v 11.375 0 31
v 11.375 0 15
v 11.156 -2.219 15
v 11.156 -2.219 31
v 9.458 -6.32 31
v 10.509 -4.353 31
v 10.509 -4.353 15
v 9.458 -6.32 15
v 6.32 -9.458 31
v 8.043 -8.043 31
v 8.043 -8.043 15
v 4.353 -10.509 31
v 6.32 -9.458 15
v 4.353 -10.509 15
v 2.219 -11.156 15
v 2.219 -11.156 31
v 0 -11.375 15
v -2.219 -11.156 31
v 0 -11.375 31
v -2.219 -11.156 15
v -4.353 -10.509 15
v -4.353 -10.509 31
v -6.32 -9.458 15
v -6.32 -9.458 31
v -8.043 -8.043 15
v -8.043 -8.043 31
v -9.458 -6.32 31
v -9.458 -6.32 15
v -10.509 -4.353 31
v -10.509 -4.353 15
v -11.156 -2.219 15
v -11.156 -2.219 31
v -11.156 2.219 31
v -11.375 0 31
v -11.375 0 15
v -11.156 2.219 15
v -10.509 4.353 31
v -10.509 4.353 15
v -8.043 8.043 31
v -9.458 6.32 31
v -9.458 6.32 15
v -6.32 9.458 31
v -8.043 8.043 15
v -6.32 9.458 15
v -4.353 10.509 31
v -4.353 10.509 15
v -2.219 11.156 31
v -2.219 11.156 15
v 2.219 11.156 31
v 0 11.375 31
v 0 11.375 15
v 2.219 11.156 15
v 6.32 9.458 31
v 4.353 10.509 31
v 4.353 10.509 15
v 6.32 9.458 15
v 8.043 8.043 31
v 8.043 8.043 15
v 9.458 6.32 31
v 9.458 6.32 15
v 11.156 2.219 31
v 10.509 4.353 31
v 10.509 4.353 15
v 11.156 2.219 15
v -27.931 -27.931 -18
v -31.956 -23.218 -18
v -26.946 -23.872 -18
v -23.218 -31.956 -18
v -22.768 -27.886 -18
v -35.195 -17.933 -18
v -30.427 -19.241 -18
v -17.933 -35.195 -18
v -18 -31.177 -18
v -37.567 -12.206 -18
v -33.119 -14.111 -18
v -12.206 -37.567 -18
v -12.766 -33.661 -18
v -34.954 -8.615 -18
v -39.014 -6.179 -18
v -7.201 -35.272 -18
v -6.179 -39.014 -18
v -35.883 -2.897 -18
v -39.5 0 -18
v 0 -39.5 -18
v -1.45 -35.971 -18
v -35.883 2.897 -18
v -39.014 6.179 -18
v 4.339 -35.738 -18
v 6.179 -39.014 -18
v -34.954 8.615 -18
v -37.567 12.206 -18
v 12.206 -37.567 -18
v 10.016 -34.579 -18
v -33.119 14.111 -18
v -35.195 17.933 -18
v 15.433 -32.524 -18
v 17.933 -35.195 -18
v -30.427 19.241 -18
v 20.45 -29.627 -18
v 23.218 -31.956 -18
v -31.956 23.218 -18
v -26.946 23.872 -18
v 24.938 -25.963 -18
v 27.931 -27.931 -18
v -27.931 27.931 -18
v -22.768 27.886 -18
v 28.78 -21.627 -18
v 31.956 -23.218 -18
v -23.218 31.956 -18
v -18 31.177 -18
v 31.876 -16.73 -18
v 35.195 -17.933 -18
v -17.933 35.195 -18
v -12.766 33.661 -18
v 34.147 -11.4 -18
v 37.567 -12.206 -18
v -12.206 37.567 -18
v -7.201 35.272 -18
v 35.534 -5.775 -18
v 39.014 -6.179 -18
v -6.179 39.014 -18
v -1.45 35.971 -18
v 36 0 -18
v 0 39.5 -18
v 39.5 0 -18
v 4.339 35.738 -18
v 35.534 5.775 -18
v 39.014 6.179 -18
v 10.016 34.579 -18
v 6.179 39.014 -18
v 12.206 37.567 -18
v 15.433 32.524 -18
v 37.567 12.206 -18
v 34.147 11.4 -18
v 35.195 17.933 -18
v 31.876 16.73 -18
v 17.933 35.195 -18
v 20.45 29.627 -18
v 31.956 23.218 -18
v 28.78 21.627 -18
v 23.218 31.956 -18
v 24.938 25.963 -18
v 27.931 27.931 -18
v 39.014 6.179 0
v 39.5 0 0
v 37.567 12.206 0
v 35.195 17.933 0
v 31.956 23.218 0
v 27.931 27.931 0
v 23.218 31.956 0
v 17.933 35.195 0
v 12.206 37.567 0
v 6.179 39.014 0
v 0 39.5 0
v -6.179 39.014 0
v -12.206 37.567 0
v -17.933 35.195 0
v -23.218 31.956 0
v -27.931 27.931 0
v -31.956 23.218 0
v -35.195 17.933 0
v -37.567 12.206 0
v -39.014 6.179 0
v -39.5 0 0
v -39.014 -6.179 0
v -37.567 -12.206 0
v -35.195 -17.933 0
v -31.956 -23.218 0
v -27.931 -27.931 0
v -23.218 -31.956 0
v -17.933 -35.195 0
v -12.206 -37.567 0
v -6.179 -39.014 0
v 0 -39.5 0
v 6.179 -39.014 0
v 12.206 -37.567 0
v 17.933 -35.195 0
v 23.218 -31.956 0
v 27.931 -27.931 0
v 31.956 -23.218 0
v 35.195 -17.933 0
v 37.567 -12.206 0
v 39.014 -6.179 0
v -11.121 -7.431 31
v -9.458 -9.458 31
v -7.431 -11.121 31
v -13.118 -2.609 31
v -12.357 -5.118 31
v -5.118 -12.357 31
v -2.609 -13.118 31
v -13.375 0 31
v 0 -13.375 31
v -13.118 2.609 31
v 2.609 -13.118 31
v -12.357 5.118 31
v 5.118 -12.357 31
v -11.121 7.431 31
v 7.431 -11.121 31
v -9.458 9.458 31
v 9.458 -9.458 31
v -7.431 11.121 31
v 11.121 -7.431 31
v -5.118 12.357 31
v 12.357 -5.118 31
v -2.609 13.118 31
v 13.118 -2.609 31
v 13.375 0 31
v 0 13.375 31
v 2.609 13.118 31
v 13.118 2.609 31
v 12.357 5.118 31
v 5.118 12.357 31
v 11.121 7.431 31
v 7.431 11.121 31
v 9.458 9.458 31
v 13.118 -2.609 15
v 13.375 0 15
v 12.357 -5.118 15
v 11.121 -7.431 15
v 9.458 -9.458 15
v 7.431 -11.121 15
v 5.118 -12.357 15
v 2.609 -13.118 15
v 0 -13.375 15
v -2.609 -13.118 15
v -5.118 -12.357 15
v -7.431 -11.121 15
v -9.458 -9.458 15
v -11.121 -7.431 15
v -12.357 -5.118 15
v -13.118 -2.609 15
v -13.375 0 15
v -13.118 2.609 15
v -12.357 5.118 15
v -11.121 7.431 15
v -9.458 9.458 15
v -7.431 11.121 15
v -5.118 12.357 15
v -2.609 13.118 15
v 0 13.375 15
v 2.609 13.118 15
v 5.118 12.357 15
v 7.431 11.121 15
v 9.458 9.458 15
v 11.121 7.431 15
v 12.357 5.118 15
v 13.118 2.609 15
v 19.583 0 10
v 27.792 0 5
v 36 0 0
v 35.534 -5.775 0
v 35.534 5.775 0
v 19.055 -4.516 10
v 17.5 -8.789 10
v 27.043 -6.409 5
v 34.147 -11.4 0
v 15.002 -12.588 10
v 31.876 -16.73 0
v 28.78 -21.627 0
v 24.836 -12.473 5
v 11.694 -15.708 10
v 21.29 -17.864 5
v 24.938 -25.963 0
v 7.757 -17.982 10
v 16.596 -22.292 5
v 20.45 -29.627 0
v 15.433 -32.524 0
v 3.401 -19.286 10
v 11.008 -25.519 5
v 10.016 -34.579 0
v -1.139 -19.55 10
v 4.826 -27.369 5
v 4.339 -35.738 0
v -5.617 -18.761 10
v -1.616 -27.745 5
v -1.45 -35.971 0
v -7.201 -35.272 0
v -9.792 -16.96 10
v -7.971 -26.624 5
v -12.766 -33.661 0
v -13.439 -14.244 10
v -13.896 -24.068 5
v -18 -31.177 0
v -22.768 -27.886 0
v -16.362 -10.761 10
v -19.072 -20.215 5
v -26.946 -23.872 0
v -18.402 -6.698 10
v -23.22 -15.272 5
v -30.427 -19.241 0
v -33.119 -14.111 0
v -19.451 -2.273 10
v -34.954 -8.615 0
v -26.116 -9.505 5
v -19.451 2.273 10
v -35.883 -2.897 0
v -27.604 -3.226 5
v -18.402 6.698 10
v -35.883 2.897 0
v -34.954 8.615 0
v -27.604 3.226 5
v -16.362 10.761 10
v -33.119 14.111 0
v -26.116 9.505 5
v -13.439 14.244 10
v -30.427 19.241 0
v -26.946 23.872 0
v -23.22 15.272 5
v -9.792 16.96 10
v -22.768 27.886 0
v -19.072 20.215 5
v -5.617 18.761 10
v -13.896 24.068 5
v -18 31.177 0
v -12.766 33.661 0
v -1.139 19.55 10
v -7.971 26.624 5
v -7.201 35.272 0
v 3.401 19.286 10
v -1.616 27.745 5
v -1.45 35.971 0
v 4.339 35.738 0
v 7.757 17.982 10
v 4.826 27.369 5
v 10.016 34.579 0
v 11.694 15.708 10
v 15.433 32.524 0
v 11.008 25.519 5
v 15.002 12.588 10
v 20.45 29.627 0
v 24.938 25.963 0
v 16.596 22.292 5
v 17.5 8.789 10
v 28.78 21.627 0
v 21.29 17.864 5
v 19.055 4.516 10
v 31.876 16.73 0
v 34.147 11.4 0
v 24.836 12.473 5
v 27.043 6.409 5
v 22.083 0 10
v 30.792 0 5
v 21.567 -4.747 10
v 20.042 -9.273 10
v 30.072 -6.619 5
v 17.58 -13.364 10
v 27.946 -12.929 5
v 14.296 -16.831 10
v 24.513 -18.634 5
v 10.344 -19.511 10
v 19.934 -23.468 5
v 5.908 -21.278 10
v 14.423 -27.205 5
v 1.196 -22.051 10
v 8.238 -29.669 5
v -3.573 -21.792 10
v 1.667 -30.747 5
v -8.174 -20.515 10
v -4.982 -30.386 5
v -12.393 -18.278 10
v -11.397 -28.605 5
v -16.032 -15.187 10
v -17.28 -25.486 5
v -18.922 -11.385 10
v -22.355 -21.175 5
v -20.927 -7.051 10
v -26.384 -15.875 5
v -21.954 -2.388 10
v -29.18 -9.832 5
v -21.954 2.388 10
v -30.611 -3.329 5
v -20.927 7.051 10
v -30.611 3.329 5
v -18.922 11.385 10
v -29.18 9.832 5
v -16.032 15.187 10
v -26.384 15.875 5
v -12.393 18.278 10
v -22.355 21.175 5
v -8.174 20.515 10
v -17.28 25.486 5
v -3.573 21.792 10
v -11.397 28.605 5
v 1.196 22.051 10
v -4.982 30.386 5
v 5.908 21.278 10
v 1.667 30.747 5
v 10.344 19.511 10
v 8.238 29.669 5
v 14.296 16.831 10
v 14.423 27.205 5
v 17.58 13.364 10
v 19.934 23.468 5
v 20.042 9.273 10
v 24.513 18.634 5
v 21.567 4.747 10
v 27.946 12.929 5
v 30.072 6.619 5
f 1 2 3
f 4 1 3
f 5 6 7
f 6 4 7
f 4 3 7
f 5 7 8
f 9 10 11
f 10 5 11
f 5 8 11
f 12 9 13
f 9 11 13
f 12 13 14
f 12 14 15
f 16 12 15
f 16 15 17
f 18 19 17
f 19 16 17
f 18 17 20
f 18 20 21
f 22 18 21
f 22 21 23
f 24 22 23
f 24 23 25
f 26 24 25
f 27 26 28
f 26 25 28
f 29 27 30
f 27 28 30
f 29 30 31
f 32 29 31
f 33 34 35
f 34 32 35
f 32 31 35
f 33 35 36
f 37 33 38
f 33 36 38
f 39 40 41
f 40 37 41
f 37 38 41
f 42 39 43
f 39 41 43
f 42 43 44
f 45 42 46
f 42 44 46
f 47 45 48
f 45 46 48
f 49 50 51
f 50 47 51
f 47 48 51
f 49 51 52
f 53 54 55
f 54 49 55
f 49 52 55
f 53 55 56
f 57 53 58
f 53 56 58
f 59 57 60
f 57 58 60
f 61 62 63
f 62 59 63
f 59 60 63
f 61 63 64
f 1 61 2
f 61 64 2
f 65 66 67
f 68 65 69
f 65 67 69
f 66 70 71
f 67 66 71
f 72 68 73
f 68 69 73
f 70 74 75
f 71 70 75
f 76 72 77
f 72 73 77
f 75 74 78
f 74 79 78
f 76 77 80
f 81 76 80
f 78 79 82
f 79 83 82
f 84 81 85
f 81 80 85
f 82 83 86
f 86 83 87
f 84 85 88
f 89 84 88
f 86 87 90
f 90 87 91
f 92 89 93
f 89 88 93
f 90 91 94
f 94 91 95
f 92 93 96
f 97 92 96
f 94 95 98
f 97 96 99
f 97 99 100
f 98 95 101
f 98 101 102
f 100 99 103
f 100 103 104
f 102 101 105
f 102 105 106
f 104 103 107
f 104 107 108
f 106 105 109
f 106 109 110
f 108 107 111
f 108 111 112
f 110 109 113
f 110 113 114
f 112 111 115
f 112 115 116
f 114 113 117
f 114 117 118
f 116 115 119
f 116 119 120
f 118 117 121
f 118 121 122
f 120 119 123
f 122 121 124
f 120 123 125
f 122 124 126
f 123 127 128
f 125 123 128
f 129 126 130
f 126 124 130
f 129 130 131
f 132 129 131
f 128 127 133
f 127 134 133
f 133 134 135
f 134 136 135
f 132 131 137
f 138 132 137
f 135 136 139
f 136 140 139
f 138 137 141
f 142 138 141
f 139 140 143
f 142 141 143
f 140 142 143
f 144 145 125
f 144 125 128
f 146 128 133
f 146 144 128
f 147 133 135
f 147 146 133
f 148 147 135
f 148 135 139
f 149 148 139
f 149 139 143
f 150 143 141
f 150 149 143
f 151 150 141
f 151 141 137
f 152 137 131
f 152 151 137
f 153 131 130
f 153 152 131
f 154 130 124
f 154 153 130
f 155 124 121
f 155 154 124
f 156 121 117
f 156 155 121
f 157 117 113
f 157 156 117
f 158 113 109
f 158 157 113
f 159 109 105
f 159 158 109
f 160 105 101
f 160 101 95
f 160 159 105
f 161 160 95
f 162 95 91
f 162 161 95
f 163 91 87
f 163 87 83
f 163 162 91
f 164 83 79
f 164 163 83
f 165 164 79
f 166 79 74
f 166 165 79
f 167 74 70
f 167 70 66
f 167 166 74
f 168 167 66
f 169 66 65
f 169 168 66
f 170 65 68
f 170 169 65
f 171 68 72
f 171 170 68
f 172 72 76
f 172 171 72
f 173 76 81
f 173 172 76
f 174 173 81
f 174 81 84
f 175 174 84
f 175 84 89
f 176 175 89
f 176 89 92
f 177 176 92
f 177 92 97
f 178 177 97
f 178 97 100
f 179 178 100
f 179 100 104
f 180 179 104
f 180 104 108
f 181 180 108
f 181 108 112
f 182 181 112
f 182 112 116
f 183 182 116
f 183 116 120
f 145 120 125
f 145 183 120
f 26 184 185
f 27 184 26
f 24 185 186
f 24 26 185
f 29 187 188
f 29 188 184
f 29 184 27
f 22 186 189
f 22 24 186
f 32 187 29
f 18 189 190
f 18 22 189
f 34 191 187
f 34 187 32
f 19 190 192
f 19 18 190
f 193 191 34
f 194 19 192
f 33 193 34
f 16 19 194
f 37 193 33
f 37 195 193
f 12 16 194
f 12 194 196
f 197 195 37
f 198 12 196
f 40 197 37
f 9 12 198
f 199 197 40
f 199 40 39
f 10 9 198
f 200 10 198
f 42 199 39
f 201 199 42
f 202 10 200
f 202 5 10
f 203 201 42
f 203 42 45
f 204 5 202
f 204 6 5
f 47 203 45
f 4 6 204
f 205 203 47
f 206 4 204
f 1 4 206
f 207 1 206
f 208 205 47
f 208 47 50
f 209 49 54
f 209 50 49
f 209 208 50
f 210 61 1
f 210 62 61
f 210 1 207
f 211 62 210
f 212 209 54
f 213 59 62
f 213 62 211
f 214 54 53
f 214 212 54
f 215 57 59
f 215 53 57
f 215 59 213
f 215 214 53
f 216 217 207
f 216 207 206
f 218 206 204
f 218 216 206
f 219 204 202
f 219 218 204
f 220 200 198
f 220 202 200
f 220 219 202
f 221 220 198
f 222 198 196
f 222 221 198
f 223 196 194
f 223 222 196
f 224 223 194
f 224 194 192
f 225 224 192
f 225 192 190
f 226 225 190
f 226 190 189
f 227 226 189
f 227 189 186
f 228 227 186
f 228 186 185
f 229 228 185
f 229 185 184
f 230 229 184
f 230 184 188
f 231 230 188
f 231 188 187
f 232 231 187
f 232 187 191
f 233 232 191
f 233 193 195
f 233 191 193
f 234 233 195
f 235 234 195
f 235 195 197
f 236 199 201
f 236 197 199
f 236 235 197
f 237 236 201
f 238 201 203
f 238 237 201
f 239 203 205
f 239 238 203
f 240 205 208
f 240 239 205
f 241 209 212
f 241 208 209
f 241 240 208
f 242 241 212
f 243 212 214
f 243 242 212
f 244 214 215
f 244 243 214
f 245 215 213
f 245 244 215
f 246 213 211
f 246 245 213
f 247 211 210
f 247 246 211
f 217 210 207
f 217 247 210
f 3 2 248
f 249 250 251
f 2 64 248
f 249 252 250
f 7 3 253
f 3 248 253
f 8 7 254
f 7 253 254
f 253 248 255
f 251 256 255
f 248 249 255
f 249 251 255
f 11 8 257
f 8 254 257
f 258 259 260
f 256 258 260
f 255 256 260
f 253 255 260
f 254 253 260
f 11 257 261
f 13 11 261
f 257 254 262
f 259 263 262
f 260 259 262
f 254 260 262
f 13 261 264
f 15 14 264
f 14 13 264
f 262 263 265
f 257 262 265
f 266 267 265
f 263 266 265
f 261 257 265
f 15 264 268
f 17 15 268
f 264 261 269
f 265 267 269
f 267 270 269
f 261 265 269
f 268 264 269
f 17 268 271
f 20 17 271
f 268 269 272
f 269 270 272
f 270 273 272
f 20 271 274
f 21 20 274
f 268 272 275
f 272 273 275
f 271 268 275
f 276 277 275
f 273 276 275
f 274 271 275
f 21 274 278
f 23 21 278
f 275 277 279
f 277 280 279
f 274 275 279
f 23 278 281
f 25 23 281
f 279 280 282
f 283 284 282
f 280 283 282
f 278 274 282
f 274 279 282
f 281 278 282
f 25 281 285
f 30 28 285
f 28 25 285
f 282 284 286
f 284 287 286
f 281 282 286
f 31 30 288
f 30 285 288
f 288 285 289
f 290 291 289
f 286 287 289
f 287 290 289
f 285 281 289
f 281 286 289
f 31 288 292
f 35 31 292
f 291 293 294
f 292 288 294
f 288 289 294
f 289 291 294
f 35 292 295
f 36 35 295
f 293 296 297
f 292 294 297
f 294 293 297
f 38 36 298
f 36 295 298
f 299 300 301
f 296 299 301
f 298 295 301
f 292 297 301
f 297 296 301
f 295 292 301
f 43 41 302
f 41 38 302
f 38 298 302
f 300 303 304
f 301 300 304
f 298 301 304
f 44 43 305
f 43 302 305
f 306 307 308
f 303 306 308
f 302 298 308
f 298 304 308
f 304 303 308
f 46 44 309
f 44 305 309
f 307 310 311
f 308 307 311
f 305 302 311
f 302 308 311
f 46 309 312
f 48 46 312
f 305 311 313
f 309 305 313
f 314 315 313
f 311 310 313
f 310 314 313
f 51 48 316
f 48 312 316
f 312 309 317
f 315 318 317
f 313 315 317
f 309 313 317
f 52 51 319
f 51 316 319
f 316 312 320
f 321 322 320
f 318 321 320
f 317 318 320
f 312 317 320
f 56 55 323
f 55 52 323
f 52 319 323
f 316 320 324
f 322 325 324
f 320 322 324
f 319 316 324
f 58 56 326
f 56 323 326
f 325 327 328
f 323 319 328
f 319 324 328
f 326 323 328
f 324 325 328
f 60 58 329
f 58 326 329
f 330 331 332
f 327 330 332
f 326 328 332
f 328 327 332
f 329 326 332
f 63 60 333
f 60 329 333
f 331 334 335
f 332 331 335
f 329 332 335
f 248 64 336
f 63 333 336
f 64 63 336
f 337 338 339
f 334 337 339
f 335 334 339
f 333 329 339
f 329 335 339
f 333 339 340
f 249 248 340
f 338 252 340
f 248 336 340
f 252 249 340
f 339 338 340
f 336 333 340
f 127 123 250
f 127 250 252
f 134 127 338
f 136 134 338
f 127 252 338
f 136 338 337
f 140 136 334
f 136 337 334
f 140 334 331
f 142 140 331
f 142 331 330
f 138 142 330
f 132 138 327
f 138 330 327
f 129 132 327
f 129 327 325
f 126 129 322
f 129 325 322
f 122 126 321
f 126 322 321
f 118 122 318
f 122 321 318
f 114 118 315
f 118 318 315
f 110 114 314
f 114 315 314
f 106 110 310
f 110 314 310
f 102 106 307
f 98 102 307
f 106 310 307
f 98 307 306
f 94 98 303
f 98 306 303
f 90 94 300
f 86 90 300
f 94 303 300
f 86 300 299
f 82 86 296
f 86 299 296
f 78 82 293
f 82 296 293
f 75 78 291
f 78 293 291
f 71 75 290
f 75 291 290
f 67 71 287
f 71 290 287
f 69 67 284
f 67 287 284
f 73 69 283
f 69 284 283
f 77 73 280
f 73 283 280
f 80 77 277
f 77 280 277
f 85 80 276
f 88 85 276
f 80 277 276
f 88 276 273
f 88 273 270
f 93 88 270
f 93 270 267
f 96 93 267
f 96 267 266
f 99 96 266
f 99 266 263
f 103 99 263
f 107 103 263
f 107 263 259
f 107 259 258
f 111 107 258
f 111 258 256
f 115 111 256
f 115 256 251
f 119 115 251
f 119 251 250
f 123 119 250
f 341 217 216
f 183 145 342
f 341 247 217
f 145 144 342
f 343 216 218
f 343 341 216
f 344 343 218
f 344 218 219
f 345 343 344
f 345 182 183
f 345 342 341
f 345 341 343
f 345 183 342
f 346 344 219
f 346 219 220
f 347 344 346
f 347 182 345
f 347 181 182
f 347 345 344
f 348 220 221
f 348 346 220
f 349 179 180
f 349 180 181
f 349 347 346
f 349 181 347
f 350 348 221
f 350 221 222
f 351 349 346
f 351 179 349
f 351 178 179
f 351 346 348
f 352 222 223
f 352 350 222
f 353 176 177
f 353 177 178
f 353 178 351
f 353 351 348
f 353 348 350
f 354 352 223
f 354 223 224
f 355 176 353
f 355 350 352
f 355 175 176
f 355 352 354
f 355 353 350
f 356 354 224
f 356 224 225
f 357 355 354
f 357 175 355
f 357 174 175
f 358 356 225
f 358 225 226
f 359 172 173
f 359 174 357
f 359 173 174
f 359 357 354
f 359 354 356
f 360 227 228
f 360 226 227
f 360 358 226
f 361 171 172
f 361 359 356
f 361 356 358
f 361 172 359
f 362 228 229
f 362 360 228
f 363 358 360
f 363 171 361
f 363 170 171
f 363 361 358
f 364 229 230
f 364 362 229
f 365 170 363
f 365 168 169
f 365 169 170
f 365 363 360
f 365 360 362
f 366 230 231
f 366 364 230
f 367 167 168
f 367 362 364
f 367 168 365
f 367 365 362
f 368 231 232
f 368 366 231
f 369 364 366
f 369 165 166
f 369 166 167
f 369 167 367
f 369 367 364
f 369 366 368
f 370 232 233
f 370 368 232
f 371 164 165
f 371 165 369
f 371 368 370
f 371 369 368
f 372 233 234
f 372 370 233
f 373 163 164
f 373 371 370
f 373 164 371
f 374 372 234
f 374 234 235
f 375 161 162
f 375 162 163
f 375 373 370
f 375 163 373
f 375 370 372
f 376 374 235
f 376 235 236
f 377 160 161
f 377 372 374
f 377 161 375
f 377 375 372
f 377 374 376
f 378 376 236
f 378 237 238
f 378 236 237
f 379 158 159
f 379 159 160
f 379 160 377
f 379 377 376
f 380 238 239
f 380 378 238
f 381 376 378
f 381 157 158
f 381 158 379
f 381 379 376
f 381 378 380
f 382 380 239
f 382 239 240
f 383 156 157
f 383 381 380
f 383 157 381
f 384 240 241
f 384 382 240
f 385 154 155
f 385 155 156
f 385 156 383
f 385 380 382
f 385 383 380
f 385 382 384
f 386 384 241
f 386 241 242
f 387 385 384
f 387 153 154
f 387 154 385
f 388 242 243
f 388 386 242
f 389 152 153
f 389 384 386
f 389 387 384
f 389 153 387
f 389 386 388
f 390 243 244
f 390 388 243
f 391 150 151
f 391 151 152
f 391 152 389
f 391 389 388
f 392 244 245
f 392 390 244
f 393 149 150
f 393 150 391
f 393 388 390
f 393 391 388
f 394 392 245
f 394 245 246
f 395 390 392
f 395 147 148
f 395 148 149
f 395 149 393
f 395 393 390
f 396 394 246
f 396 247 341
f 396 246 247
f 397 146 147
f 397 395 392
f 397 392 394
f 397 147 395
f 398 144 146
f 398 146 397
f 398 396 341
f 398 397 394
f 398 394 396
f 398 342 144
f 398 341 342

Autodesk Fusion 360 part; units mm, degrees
sketch "Boceto1" plane through (0, 0, 0) normal (0, 0, 1) x (1, 0, 0)
  circle A0 centre (0, 0) radius 39.5
  circle A1 centre (0, 0) radius 36
  dimension "d1" = 79
  dimension "d2" = -3.5
ref_plane "PlanoDeObra1" through (0, 0, 15) normal (0, 0, 1) x (1, 0, 0)
sketch "Boceto2" plane through (0, 0, 15) normal (0, 0, 1) x (1, 0, 0)
  circle A0 centre (0, 0) radius 13.375
  circle A1 centre (0, 0) radius 11.375
  dimension "d4" = 26.75
  dimension "d5" = -2
loft "Solevación1" add profiles "Boceto1", "Boceto2" section 1 section 2
loft "Solevación2" cut profiles "Boceto2", "Boceto1" section 1 contours A1 section 2 contours A1
extrude "Extruir1" add sketch "Boceto2" along normal blind 16
extrude "Extruir2" add sketch "Boceto1" against normal blind 18
